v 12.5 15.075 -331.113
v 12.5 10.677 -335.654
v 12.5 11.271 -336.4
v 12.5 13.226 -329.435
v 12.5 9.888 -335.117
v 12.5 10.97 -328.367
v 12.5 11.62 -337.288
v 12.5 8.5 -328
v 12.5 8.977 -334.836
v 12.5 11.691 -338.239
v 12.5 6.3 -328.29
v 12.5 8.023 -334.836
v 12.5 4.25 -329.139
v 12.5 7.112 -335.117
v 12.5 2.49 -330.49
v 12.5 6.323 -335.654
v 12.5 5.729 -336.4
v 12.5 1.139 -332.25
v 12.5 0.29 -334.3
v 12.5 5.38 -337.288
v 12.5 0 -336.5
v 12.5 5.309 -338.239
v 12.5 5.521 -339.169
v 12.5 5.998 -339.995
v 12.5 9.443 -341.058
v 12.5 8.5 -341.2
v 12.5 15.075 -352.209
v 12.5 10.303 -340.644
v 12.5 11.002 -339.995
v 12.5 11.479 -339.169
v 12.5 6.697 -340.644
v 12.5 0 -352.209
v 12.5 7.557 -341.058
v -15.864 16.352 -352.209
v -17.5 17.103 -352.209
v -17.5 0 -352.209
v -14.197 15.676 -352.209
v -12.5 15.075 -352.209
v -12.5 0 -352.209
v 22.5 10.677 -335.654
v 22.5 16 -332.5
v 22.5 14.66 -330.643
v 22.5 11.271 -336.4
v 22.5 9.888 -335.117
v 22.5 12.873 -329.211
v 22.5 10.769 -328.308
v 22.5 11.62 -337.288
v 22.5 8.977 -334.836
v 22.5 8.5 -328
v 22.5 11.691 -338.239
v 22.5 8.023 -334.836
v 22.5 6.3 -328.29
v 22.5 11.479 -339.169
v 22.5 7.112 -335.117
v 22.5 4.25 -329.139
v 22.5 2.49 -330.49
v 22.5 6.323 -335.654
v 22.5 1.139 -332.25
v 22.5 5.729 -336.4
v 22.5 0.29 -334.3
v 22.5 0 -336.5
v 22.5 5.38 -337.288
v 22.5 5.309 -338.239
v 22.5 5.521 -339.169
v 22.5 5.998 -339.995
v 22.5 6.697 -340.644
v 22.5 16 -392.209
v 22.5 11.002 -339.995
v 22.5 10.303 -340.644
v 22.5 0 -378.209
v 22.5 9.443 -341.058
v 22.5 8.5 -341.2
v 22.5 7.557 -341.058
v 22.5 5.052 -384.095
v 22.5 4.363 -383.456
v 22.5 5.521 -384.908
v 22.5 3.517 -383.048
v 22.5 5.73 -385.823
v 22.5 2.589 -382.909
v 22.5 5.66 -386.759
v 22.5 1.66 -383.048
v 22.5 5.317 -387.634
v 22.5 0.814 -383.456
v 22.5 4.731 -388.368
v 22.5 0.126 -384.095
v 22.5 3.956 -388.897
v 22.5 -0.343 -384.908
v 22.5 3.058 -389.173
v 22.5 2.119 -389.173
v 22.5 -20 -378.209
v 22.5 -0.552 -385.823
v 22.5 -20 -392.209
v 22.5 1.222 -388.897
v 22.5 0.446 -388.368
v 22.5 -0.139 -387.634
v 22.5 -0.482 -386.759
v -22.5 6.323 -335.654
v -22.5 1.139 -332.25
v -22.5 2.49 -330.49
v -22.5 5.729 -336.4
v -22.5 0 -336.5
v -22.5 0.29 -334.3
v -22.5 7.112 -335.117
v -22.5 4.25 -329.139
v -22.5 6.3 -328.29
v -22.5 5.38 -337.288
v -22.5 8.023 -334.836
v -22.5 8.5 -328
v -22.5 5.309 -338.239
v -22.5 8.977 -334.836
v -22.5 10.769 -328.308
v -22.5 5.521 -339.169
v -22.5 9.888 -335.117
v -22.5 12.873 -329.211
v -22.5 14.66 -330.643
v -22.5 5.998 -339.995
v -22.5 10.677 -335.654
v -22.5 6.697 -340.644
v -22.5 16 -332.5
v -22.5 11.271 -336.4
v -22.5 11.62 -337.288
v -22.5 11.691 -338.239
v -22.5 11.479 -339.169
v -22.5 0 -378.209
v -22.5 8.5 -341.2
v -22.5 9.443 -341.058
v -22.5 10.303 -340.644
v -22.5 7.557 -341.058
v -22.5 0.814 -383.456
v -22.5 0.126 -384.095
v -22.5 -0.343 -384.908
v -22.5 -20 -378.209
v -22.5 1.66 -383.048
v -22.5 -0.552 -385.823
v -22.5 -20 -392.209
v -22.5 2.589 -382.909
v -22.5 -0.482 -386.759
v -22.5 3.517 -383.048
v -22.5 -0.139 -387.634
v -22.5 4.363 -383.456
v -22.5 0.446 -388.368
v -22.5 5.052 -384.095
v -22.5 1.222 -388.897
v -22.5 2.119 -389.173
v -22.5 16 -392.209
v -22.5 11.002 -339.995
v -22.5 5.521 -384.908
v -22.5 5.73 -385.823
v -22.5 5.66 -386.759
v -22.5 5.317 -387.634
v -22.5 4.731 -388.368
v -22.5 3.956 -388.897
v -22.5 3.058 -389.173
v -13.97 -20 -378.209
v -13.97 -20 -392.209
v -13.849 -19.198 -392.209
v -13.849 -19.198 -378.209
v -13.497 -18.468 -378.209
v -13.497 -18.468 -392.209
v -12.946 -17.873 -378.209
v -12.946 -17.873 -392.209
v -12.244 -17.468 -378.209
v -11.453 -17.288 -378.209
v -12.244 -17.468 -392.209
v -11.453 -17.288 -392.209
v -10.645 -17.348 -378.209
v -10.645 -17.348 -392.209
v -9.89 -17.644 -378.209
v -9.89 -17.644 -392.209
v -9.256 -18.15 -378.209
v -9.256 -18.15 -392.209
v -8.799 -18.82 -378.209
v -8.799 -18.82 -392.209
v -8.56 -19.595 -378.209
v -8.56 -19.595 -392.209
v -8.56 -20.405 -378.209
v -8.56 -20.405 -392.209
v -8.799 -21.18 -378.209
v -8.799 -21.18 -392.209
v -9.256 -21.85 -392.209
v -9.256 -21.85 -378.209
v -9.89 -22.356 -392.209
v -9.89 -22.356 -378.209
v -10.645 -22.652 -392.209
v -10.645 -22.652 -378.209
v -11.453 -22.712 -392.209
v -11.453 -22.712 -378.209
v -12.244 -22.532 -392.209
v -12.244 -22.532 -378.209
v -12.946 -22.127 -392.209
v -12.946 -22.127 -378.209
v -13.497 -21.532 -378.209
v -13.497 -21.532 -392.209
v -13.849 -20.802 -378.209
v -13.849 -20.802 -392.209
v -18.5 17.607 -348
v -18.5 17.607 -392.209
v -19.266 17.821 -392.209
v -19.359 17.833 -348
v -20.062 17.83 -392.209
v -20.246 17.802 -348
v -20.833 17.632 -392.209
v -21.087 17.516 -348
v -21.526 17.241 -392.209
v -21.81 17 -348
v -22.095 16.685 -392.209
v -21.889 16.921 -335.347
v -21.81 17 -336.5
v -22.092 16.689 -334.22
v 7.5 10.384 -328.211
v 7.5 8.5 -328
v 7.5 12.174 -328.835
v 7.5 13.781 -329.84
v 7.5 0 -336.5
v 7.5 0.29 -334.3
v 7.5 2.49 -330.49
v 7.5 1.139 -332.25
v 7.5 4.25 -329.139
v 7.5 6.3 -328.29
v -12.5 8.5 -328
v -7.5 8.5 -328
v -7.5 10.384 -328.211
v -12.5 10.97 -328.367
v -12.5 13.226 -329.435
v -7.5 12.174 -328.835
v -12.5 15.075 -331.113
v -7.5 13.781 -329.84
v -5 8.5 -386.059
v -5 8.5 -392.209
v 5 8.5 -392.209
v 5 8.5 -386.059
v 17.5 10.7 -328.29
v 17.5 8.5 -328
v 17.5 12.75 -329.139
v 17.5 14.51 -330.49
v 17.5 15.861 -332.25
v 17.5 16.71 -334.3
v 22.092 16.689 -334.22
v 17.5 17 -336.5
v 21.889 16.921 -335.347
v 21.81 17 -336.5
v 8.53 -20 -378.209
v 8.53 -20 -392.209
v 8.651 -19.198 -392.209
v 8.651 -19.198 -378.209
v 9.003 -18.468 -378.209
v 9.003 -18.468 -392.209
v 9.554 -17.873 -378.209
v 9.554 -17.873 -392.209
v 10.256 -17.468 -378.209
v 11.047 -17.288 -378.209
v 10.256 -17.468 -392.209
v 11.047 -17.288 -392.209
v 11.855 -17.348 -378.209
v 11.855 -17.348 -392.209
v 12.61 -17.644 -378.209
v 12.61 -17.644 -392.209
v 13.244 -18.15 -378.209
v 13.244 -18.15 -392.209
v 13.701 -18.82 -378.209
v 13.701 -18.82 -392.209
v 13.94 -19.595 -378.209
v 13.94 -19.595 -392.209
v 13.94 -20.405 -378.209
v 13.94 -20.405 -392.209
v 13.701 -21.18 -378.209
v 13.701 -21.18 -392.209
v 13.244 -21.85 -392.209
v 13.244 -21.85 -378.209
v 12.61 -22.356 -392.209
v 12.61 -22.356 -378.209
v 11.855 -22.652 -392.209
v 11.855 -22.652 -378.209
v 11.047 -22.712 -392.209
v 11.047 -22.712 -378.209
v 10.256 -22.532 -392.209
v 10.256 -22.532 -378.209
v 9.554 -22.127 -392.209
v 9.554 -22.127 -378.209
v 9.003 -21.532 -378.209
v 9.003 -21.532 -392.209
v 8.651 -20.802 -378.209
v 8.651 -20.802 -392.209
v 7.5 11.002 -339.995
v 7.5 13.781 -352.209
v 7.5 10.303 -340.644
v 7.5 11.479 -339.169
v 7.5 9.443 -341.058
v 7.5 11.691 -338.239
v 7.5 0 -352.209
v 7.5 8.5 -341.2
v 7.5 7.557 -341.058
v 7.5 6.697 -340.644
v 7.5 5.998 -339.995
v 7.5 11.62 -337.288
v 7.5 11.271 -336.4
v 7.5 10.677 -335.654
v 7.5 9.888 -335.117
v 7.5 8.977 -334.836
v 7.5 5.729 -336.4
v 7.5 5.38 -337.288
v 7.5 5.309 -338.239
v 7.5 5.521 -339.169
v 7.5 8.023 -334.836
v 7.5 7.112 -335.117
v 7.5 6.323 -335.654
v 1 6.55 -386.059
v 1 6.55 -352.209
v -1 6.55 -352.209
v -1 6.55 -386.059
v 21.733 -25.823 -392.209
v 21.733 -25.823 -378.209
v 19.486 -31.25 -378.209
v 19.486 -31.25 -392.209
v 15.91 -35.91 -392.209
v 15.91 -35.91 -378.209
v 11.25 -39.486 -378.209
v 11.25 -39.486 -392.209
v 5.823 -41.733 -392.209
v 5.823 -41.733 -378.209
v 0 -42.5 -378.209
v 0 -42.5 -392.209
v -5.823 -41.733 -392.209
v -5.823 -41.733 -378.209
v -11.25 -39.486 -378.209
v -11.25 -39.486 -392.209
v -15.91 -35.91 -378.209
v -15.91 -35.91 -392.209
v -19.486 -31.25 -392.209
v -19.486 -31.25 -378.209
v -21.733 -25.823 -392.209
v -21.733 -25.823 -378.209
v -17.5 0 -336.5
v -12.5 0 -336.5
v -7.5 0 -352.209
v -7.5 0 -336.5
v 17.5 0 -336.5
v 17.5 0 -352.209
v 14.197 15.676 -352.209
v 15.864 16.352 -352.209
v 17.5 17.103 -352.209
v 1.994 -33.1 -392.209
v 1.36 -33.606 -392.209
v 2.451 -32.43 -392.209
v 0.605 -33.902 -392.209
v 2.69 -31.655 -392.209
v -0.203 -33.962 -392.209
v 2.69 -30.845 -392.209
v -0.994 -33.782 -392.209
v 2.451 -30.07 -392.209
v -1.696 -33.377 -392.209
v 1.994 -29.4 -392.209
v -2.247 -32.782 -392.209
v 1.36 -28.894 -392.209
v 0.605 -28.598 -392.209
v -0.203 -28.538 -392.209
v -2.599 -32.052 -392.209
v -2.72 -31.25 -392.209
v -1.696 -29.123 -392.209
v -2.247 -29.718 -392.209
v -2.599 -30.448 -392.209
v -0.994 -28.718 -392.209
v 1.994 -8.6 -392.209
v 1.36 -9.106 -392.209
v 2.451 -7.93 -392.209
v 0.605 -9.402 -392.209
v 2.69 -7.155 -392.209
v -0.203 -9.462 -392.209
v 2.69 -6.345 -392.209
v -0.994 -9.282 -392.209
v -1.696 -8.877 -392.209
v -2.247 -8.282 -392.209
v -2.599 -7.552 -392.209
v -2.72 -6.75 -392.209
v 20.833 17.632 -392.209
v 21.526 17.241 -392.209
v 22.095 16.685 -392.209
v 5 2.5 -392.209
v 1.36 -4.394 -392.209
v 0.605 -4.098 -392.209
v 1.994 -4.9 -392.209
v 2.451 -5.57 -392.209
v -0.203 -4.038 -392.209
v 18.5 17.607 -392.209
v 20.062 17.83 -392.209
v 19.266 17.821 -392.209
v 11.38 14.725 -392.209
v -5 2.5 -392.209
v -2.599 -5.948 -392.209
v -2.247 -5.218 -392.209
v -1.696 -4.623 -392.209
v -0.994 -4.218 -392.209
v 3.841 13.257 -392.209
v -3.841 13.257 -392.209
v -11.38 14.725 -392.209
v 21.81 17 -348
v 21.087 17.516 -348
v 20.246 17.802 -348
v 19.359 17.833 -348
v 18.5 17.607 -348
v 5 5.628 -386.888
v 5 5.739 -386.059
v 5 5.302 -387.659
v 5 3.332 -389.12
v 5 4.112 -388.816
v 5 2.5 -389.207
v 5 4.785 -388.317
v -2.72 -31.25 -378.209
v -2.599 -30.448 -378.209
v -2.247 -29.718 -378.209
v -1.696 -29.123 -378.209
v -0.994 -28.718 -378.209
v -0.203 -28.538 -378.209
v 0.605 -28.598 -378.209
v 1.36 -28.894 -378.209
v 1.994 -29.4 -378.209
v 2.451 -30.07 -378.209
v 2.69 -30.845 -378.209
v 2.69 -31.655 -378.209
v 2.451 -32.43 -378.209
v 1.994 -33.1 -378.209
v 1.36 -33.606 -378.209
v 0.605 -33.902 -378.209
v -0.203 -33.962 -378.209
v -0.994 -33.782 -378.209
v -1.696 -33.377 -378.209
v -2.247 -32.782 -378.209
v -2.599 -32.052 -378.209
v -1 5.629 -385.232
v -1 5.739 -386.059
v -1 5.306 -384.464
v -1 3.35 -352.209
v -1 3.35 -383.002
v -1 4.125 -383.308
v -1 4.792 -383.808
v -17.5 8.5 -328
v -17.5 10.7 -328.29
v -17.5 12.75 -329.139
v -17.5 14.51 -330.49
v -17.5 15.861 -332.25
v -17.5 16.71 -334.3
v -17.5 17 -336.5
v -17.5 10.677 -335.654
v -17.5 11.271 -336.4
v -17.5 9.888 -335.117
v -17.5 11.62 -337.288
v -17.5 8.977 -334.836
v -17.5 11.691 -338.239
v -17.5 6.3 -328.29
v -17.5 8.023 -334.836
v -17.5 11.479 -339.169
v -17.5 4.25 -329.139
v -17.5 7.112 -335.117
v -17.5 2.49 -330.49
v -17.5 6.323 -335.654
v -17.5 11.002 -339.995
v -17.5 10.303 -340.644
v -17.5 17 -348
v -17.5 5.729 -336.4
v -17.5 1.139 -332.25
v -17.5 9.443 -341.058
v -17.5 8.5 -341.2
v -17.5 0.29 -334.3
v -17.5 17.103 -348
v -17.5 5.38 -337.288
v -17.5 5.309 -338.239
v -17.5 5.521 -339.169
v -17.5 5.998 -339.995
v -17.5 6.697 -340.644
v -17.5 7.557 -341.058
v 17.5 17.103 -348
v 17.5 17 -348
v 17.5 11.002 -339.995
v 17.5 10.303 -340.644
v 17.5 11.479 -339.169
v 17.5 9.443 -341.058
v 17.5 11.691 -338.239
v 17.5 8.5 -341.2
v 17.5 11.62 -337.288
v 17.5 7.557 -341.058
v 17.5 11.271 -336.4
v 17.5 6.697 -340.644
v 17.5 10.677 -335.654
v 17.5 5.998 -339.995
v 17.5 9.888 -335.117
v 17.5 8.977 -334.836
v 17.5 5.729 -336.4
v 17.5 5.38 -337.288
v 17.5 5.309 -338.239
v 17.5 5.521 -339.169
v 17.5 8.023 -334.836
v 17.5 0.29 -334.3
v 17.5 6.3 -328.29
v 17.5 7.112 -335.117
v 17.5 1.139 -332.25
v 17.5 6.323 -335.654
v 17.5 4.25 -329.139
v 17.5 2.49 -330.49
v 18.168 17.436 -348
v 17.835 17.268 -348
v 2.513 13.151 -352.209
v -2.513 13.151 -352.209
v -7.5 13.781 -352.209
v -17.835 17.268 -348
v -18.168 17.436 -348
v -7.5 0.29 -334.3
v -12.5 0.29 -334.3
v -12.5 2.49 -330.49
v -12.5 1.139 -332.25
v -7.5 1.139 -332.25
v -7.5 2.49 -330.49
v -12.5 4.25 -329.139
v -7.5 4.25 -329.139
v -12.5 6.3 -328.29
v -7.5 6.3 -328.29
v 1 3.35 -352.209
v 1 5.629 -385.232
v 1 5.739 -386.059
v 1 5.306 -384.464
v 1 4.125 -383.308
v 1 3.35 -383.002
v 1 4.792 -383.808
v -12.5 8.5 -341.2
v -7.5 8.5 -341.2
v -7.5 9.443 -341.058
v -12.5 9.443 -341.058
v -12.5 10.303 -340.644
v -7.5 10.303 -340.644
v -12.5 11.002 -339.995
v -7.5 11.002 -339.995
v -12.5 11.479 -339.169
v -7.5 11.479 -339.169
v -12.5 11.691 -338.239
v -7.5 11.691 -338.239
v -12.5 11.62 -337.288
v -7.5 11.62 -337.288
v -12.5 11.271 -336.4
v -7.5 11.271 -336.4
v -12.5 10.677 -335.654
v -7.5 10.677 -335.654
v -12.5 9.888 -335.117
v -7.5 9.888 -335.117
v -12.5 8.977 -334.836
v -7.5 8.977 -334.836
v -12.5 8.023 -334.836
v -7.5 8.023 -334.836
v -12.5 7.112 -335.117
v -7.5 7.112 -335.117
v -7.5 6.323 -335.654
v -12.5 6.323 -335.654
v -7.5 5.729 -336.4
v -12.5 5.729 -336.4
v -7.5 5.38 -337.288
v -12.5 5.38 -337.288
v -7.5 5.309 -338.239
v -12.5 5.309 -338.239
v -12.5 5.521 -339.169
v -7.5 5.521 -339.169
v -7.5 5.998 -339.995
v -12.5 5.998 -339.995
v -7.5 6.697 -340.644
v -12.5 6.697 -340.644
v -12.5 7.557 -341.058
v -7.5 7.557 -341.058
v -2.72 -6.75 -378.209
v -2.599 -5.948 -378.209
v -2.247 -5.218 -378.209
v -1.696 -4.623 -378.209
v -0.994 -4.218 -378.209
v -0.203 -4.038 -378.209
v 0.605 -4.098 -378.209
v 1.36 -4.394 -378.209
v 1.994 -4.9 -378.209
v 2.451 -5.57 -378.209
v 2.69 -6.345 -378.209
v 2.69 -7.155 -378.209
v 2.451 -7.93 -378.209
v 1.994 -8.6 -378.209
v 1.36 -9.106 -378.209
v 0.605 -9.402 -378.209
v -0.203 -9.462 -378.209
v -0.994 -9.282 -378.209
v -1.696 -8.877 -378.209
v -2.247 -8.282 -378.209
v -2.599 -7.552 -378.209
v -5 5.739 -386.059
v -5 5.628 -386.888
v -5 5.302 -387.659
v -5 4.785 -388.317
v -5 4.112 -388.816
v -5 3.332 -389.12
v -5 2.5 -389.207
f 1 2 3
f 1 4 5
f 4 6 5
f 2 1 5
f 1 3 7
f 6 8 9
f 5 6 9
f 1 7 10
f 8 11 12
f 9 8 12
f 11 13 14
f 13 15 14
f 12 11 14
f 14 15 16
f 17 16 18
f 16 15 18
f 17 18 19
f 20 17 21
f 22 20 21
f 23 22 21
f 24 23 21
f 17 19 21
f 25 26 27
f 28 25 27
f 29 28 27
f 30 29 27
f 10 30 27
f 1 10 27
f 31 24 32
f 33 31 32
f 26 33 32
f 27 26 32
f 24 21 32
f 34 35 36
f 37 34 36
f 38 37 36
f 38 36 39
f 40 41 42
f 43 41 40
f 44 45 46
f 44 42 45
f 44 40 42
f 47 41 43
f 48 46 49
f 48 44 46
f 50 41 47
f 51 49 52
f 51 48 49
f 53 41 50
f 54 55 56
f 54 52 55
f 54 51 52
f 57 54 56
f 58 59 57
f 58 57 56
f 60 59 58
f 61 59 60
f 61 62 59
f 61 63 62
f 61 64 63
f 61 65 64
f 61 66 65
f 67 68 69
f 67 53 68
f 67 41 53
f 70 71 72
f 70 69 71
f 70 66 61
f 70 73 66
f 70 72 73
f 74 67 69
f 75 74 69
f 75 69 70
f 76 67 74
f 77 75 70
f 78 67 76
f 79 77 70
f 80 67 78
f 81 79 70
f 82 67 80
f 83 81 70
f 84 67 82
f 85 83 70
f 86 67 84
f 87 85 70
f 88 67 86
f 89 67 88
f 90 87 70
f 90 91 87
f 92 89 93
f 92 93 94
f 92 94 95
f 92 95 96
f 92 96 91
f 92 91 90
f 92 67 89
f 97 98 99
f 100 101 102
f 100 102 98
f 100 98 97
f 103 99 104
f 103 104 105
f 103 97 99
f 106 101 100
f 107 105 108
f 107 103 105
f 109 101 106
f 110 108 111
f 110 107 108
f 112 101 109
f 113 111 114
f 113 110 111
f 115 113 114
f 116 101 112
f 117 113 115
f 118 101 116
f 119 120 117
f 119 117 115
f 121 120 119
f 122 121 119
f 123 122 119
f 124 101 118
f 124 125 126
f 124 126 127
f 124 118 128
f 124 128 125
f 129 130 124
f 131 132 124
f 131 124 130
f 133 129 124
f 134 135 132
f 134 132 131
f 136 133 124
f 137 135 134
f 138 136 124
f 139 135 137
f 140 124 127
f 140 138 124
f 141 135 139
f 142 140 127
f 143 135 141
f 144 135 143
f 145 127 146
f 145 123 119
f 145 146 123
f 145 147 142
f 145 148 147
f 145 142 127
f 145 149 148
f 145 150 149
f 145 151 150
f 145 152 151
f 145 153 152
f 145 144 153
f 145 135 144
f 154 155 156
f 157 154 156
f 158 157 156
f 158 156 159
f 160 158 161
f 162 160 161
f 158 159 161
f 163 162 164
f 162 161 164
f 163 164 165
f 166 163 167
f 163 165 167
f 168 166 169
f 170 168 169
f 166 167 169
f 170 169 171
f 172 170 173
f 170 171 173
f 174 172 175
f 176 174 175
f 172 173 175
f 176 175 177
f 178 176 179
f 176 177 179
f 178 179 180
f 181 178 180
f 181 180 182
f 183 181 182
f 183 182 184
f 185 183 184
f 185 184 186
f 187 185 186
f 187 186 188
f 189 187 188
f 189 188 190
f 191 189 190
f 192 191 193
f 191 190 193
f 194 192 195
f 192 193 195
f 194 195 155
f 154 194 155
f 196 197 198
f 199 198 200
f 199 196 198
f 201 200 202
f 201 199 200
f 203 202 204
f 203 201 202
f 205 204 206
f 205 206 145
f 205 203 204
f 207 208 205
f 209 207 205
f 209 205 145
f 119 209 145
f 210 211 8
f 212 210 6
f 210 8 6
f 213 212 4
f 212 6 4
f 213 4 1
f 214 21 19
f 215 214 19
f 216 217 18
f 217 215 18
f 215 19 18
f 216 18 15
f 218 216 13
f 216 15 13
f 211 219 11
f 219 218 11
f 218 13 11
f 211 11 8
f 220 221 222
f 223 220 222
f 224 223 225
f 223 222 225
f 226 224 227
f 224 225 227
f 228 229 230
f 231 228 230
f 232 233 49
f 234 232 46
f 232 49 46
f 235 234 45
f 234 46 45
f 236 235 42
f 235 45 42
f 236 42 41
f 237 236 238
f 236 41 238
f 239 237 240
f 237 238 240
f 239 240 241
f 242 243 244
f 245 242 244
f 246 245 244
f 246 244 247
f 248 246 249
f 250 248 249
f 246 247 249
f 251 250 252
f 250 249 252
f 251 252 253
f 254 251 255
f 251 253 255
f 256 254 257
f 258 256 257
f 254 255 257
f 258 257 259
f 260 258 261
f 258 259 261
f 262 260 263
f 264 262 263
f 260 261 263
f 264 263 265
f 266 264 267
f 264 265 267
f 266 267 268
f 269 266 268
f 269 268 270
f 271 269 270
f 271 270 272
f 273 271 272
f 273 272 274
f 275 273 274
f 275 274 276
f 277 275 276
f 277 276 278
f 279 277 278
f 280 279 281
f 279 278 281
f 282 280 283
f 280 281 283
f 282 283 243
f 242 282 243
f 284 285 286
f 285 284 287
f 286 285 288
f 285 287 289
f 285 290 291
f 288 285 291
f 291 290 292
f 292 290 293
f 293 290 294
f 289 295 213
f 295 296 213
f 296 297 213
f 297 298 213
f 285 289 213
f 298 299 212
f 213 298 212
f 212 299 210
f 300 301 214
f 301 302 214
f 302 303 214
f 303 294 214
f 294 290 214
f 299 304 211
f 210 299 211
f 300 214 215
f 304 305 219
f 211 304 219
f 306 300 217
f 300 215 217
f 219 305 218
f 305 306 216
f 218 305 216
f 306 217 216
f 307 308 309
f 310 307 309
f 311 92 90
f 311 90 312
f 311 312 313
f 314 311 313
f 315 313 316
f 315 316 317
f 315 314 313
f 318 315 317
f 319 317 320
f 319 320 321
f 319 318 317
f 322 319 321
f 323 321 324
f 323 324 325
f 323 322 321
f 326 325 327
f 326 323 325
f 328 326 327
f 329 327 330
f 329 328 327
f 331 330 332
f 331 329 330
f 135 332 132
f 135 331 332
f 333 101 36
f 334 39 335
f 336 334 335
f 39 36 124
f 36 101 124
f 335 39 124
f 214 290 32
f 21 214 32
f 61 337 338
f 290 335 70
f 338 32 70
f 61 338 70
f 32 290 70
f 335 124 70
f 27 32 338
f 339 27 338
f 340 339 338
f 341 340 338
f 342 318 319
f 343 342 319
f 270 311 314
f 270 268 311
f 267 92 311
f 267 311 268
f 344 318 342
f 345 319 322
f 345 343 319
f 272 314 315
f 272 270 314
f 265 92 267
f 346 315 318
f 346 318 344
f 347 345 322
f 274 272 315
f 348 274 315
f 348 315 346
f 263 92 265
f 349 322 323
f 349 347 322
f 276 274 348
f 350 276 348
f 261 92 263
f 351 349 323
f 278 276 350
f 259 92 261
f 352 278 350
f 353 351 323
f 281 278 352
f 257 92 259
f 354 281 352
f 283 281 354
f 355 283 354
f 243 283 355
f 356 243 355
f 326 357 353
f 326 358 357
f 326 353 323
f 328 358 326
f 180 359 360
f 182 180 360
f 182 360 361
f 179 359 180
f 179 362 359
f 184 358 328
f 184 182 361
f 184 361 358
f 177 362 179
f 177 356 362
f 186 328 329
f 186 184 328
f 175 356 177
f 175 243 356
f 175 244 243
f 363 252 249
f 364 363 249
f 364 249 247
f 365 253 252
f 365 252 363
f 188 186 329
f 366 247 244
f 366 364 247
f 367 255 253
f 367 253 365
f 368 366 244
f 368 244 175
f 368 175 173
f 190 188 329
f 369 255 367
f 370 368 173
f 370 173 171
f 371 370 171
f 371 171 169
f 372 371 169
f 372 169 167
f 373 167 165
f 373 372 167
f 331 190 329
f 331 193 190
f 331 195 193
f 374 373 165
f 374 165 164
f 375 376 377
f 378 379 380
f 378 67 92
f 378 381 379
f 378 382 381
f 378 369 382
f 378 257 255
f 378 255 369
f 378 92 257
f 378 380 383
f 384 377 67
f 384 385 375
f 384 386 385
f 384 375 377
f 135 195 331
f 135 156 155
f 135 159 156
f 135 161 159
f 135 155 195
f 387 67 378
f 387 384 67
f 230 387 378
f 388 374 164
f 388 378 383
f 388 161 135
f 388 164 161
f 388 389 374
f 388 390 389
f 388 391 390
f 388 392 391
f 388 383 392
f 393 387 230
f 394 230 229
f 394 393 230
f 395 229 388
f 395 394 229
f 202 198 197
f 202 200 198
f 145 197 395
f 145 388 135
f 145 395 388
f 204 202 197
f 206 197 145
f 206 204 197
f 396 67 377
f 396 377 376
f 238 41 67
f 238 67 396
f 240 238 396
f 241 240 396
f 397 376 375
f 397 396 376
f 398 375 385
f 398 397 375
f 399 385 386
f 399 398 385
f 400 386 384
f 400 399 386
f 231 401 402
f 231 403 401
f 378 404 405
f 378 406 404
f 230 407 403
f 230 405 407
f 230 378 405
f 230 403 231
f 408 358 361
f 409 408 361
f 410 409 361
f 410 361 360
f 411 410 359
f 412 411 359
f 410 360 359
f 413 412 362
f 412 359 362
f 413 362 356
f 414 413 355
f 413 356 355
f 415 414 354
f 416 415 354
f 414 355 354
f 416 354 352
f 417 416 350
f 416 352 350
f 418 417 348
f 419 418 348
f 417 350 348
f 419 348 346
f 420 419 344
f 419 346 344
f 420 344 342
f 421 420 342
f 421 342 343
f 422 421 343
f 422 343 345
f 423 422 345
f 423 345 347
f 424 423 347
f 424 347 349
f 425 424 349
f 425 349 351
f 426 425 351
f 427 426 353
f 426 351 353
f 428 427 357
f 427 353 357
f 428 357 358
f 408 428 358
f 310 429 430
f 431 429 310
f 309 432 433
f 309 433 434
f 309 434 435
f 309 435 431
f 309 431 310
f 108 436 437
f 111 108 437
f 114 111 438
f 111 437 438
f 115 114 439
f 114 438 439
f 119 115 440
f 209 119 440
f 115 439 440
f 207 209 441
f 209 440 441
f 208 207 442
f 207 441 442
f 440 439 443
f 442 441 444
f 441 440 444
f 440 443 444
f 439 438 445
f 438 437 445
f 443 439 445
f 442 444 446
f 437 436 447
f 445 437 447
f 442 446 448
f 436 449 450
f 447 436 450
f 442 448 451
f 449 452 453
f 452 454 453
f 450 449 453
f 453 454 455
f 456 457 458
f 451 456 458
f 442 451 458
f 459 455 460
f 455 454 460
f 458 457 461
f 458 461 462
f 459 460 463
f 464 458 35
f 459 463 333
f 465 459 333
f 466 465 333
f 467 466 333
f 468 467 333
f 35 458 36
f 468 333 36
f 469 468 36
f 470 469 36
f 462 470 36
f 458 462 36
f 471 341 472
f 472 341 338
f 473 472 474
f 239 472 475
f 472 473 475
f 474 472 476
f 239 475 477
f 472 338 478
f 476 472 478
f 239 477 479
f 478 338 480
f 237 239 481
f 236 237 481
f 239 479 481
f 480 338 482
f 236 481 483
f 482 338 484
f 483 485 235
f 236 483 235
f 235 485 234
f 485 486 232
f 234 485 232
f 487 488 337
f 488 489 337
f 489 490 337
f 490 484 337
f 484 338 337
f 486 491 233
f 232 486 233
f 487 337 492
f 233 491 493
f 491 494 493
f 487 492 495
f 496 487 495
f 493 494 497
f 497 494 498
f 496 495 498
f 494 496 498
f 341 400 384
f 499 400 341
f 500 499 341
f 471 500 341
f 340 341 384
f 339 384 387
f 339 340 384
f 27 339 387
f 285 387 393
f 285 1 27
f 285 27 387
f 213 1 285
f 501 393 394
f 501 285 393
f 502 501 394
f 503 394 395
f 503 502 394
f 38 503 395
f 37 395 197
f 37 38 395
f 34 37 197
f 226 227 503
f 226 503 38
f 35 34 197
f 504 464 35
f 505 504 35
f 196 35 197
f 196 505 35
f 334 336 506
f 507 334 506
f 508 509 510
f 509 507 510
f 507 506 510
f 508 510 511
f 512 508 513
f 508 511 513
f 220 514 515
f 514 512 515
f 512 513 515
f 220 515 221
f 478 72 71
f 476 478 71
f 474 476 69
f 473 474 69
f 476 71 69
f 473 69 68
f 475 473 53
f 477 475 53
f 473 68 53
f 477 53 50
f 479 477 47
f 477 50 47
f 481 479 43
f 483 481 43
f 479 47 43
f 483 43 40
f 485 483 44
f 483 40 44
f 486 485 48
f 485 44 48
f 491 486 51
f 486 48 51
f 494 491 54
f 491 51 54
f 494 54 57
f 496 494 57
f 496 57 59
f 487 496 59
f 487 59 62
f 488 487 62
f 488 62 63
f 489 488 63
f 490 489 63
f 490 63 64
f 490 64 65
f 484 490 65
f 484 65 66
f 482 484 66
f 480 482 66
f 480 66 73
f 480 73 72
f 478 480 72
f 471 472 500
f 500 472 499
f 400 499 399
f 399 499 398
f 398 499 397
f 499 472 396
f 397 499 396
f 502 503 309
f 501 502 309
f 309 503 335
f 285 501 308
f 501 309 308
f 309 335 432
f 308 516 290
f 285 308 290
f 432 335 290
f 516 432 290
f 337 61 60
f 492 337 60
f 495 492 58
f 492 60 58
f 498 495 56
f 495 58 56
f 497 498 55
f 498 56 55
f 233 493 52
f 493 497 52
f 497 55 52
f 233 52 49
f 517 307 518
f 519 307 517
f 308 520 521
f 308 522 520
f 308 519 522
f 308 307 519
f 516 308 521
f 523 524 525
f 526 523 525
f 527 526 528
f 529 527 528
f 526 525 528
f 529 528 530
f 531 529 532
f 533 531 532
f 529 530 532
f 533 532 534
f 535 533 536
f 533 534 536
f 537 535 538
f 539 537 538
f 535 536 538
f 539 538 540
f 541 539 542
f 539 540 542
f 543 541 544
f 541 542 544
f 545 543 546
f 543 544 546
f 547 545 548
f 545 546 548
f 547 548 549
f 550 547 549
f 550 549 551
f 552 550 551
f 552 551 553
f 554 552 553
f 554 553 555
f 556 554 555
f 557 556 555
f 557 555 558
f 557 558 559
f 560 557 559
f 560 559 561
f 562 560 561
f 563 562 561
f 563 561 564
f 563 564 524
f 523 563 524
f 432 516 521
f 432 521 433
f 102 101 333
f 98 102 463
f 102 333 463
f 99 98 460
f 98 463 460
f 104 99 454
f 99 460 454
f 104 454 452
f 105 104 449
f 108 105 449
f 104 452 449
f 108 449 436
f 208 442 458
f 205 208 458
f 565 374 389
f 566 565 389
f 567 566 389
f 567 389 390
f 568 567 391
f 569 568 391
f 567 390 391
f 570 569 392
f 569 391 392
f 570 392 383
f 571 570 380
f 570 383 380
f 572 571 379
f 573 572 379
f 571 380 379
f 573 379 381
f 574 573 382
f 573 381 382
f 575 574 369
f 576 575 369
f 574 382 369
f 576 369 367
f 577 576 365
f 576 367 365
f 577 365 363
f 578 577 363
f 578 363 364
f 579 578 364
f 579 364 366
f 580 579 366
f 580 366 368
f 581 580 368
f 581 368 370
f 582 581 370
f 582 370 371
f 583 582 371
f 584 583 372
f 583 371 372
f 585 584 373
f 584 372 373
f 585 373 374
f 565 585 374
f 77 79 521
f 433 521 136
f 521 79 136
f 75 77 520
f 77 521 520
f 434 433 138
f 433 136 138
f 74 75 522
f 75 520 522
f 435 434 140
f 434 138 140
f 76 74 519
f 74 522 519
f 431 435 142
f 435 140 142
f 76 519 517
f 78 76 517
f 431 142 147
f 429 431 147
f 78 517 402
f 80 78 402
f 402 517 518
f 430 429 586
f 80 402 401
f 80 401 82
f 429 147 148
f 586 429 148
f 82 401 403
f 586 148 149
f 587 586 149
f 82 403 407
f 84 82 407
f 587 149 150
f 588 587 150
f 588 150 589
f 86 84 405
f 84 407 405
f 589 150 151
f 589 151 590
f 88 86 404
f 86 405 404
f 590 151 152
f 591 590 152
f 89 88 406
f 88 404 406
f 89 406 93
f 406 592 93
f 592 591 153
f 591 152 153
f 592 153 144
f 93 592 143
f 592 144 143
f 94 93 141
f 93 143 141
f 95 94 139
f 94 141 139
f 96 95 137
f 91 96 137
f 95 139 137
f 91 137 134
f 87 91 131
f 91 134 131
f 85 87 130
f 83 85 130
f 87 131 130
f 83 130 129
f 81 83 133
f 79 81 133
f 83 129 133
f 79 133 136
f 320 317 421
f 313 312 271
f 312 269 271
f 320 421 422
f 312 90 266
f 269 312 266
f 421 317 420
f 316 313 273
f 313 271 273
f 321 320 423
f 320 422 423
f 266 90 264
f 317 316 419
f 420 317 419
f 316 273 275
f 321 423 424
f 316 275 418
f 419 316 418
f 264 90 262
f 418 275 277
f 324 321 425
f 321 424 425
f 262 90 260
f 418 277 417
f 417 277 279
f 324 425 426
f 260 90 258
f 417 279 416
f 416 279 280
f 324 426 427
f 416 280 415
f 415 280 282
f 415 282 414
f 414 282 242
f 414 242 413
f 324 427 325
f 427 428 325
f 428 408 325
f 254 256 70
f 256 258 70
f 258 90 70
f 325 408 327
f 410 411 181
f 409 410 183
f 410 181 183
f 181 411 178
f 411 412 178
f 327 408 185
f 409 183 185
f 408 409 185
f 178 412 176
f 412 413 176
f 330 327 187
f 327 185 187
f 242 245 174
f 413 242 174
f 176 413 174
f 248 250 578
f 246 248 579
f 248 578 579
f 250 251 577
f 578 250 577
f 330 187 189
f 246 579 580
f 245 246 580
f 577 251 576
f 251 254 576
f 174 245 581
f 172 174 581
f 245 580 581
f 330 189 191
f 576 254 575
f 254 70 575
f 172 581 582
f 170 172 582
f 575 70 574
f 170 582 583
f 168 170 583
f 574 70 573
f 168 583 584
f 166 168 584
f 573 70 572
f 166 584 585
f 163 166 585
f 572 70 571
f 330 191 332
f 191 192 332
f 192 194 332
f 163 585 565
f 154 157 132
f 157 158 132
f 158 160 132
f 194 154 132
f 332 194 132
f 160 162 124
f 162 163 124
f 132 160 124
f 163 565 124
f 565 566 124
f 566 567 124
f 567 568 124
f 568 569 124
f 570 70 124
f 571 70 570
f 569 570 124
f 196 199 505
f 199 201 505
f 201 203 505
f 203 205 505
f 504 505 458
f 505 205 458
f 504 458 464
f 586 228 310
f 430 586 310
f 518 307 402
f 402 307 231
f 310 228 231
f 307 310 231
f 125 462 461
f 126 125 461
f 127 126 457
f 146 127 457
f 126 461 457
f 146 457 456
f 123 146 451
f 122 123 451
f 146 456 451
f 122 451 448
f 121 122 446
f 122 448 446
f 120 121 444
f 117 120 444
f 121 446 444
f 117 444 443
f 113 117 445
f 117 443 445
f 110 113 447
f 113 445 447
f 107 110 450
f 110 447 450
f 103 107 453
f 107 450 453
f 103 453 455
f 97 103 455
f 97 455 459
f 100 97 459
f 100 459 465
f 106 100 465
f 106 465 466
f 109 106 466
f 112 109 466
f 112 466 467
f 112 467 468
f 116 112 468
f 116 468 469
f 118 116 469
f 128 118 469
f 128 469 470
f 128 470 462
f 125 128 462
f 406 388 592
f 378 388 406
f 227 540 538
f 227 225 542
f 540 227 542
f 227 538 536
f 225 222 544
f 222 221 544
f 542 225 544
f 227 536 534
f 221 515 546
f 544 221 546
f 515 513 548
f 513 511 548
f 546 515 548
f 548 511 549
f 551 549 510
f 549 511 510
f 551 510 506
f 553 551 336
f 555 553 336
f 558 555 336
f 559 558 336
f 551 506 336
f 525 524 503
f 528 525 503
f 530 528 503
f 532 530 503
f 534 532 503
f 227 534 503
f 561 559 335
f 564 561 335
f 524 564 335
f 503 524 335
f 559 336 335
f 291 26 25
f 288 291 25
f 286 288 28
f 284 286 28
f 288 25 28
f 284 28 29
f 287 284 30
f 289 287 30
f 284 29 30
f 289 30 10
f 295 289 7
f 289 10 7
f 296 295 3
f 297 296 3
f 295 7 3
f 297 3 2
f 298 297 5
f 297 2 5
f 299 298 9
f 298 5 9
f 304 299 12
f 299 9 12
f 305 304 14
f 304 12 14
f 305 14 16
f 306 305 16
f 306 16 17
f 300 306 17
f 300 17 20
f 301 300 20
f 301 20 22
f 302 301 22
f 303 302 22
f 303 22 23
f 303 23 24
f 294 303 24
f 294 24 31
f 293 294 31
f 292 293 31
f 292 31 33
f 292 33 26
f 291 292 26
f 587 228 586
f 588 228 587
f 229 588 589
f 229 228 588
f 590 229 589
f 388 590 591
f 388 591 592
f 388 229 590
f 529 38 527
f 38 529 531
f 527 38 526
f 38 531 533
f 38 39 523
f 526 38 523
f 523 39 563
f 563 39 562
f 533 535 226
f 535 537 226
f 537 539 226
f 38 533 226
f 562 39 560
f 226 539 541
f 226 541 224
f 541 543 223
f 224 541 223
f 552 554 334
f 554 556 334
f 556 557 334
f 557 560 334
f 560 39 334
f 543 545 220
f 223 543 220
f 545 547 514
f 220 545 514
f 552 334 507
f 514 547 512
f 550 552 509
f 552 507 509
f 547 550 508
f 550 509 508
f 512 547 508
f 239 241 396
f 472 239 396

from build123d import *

# Parameters (mm, degrees)
BOSS_EXTRUDE1_DEPTH = 20
CUT_EXTRUDE23_DEPTH = 444
CUT_EXTRUDE26_DEPTH = 444
BOSS_EXTRUDE2_DEPTH = 14
SKETCH15_R          = 2.72
CUT_EXTRUDE27_DEPTH = 14
SKETCH16_R          = 3.25
SKETCH16_R_2        = 3.15
CUT_EXTRUDE28_DEPTH = 45
CUT_EXTRUDE29_DEPTH = 6.15
CUT_EXTRUDE31_DEPTH = 45
SKETCH18_R          = 3.2
CUT_EXTRUDE32_DEPTH = 45


with BuildPart() as part:
    # Sketch1 → Boss-Extrude1 (new body)
    with BuildSketch(Plane(origin=(0, 0, 0), x_dir=(1, 0, 0), z_dir=(0, 1, 0))):
        Polygon((-22.5, 328), (-17.5, 328), (-17.5, 352.208543952), (-12.5, 352.208543952), (-12.5, 328), (-7.5, 328), (-7.5, 352.208543952), (-2.5, 352.208543952), (2.5, 352.208543952), (7.5, 352.208543952), (7.5, 328), (12.5, 328), (12.5, 352.208543952), (17.5, 352.208543952), (17.5, 328), (22.5, 328), (22.5, 392.208543952), (-22.5, 392.208543952), align=None)
    extrude(amount=BOSS_EXTRUDE1_DEPTH)

    # Sketch2 → Cut-Extrude23 (cut)
    with BuildSketch(Plane.XY.offset(50)):
        with BuildLine():
            Line((-22.5, 20), (22.5, 20))
            Line((22.5, 20), (22.5, 16))
            ThreePointArc((22.5, 16), (20.832845478, 17.631987193), (18.5, 17.607120136))
            ThreePointArc((18.5, 17.607120136), (0, 13.071891388), (-18.5, 17.607120136))
            ThreePointArc((-18.5, 17.607120136), (-20.832845478, 17.631987193), (-22.5, 16))
            Line((-22.5, 16), (-22.5, 20))
        make_face()
    extrude(amount=-CUT_EXTRUDE23_DEPTH, mode=Mode.SUBTRACT)

    # Sketch12 → Cut-Extrude26 (cut)
    with BuildSketch(Plane.XY.offset(50)):
        Polygon((-1, 3.35), (-1, 6.55), (0, 6.55), (1, 6.55), (1, 3.35), align=None)
    extrude(amount=-CUT_EXTRUDE26_DEPTH, mode=Mode.SUBTRACT)

    # Sketch14 → Boss-Extrude2 (add)
    with BuildSketch(Plane(origin=(0, 0, -392.208543952), x_dir=(-1, 0, 0), z_dir=(0, 0, -1))):
        with BuildLine():
            Line((-22.5, 0), (-22.5, -20))
            ThreePointArc((-22.5, -20), (0, -42.5), (22.5, -20))
            Line((22.5, -20), (22.5, 0))
            Line((22.5, 0), (-22.5, 0))
        make_face()
    extrude(amount=-BOSS_EXTRUDE2_DEPTH)

    # Sketch15 → Cut-Extrude27 (cut)
    with BuildSketch(Plane(origin=(0, 0, -392.208543952), x_dir=(-1, 0, 0), z_dir=(0, 0, -1))):
        with Locations((11.25, -20)):
            Circle(SKETCH15_R)
        with Locations((0, -6.75)):
            Circle(SKETCH15_R)
        with Locations((-11.25, -20)):
            Circle(SKETCH15_R)
        with Locations((0, -31.25)):
            Circle(SKETCH15_R)
    extrude(amount=-CUT_EXTRUDE27_DEPTH, mode=Mode.SUBTRACT)

    # Sketch16 → Cut-Extrude28 (cut)
    with BuildSketch(Plane.ZY.offset(22.5)):
        with Locations((-1.25, 8.5)):
            Circle(SKETCH16_R)
        with Locations((-386.058543952, 2.588831384)):
            Circle(SKETCH16_R_2)
    extrude(amount=-CUT_EXTRUDE28_DEPTH, mode=Mode.SUBTRACT)

    # Sketch17 → Cut-Extrude29 (cut)
    with BuildSketch(Plane(origin=(0, 0, -392.208543952), x_dir=(-1, 0, 0), z_dir=(0, 0, -1))):
        Polygon((1, 8.5), (5, 8.5), (5, 2.5), (-5, 2.5), (-5, 8.5), (-1, 8.5), align=None)
    extrude(amount=-CUT_EXTRUDE29_DEPTH, mode=Mode.SUBTRACT)

    # Sketch8 → Cut-Extrude31 (cut)
    with BuildSketch(Plane(origin=(22.5, 0, 0), x_dir=(0, 0, -1), z_dir=(1, 0, 0))):
        with BuildLine():
            ThreePointArc((336.5, 0), (330.48959236, 2.48959236), (328, 8.5))
            Line((328, 8.5), (328, 0))
            Line((328, 0), (336.5, 0))
        make_face()
        with BuildLine():
            Line((336.5, 20), (328, 20))
            Line((328, 20), (328, 17))
            Line((328, 17), (328, 8.5))
            ThreePointArc((328, 8.5), (330.48959236, 14.51040764), (336.5, 17))
            Line((336.5, 17), (348, 17))
            Line((348, 17), (348, 20))
            Line((348, 20), (336.5, 20))
        make_face()
    extrude(amount=-CUT_EXTRUDE31_DEPTH, mode=Mode.SUBTRACT)

    # Sketch18 → Cut-Extrude32 (cut)
    with BuildSketch(Plane(origin=(22.5, 0, 0), x_dir=(0, 0, -1), z_dir=(1, 0, 0))):
        with Locations((338, 8.5)):
            Circle(SKETCH18_R)
    extrude(amount=-CUT_EXTRUDE32_DEPTH, mode=Mode.SUBTRACT)


solid = part.part
